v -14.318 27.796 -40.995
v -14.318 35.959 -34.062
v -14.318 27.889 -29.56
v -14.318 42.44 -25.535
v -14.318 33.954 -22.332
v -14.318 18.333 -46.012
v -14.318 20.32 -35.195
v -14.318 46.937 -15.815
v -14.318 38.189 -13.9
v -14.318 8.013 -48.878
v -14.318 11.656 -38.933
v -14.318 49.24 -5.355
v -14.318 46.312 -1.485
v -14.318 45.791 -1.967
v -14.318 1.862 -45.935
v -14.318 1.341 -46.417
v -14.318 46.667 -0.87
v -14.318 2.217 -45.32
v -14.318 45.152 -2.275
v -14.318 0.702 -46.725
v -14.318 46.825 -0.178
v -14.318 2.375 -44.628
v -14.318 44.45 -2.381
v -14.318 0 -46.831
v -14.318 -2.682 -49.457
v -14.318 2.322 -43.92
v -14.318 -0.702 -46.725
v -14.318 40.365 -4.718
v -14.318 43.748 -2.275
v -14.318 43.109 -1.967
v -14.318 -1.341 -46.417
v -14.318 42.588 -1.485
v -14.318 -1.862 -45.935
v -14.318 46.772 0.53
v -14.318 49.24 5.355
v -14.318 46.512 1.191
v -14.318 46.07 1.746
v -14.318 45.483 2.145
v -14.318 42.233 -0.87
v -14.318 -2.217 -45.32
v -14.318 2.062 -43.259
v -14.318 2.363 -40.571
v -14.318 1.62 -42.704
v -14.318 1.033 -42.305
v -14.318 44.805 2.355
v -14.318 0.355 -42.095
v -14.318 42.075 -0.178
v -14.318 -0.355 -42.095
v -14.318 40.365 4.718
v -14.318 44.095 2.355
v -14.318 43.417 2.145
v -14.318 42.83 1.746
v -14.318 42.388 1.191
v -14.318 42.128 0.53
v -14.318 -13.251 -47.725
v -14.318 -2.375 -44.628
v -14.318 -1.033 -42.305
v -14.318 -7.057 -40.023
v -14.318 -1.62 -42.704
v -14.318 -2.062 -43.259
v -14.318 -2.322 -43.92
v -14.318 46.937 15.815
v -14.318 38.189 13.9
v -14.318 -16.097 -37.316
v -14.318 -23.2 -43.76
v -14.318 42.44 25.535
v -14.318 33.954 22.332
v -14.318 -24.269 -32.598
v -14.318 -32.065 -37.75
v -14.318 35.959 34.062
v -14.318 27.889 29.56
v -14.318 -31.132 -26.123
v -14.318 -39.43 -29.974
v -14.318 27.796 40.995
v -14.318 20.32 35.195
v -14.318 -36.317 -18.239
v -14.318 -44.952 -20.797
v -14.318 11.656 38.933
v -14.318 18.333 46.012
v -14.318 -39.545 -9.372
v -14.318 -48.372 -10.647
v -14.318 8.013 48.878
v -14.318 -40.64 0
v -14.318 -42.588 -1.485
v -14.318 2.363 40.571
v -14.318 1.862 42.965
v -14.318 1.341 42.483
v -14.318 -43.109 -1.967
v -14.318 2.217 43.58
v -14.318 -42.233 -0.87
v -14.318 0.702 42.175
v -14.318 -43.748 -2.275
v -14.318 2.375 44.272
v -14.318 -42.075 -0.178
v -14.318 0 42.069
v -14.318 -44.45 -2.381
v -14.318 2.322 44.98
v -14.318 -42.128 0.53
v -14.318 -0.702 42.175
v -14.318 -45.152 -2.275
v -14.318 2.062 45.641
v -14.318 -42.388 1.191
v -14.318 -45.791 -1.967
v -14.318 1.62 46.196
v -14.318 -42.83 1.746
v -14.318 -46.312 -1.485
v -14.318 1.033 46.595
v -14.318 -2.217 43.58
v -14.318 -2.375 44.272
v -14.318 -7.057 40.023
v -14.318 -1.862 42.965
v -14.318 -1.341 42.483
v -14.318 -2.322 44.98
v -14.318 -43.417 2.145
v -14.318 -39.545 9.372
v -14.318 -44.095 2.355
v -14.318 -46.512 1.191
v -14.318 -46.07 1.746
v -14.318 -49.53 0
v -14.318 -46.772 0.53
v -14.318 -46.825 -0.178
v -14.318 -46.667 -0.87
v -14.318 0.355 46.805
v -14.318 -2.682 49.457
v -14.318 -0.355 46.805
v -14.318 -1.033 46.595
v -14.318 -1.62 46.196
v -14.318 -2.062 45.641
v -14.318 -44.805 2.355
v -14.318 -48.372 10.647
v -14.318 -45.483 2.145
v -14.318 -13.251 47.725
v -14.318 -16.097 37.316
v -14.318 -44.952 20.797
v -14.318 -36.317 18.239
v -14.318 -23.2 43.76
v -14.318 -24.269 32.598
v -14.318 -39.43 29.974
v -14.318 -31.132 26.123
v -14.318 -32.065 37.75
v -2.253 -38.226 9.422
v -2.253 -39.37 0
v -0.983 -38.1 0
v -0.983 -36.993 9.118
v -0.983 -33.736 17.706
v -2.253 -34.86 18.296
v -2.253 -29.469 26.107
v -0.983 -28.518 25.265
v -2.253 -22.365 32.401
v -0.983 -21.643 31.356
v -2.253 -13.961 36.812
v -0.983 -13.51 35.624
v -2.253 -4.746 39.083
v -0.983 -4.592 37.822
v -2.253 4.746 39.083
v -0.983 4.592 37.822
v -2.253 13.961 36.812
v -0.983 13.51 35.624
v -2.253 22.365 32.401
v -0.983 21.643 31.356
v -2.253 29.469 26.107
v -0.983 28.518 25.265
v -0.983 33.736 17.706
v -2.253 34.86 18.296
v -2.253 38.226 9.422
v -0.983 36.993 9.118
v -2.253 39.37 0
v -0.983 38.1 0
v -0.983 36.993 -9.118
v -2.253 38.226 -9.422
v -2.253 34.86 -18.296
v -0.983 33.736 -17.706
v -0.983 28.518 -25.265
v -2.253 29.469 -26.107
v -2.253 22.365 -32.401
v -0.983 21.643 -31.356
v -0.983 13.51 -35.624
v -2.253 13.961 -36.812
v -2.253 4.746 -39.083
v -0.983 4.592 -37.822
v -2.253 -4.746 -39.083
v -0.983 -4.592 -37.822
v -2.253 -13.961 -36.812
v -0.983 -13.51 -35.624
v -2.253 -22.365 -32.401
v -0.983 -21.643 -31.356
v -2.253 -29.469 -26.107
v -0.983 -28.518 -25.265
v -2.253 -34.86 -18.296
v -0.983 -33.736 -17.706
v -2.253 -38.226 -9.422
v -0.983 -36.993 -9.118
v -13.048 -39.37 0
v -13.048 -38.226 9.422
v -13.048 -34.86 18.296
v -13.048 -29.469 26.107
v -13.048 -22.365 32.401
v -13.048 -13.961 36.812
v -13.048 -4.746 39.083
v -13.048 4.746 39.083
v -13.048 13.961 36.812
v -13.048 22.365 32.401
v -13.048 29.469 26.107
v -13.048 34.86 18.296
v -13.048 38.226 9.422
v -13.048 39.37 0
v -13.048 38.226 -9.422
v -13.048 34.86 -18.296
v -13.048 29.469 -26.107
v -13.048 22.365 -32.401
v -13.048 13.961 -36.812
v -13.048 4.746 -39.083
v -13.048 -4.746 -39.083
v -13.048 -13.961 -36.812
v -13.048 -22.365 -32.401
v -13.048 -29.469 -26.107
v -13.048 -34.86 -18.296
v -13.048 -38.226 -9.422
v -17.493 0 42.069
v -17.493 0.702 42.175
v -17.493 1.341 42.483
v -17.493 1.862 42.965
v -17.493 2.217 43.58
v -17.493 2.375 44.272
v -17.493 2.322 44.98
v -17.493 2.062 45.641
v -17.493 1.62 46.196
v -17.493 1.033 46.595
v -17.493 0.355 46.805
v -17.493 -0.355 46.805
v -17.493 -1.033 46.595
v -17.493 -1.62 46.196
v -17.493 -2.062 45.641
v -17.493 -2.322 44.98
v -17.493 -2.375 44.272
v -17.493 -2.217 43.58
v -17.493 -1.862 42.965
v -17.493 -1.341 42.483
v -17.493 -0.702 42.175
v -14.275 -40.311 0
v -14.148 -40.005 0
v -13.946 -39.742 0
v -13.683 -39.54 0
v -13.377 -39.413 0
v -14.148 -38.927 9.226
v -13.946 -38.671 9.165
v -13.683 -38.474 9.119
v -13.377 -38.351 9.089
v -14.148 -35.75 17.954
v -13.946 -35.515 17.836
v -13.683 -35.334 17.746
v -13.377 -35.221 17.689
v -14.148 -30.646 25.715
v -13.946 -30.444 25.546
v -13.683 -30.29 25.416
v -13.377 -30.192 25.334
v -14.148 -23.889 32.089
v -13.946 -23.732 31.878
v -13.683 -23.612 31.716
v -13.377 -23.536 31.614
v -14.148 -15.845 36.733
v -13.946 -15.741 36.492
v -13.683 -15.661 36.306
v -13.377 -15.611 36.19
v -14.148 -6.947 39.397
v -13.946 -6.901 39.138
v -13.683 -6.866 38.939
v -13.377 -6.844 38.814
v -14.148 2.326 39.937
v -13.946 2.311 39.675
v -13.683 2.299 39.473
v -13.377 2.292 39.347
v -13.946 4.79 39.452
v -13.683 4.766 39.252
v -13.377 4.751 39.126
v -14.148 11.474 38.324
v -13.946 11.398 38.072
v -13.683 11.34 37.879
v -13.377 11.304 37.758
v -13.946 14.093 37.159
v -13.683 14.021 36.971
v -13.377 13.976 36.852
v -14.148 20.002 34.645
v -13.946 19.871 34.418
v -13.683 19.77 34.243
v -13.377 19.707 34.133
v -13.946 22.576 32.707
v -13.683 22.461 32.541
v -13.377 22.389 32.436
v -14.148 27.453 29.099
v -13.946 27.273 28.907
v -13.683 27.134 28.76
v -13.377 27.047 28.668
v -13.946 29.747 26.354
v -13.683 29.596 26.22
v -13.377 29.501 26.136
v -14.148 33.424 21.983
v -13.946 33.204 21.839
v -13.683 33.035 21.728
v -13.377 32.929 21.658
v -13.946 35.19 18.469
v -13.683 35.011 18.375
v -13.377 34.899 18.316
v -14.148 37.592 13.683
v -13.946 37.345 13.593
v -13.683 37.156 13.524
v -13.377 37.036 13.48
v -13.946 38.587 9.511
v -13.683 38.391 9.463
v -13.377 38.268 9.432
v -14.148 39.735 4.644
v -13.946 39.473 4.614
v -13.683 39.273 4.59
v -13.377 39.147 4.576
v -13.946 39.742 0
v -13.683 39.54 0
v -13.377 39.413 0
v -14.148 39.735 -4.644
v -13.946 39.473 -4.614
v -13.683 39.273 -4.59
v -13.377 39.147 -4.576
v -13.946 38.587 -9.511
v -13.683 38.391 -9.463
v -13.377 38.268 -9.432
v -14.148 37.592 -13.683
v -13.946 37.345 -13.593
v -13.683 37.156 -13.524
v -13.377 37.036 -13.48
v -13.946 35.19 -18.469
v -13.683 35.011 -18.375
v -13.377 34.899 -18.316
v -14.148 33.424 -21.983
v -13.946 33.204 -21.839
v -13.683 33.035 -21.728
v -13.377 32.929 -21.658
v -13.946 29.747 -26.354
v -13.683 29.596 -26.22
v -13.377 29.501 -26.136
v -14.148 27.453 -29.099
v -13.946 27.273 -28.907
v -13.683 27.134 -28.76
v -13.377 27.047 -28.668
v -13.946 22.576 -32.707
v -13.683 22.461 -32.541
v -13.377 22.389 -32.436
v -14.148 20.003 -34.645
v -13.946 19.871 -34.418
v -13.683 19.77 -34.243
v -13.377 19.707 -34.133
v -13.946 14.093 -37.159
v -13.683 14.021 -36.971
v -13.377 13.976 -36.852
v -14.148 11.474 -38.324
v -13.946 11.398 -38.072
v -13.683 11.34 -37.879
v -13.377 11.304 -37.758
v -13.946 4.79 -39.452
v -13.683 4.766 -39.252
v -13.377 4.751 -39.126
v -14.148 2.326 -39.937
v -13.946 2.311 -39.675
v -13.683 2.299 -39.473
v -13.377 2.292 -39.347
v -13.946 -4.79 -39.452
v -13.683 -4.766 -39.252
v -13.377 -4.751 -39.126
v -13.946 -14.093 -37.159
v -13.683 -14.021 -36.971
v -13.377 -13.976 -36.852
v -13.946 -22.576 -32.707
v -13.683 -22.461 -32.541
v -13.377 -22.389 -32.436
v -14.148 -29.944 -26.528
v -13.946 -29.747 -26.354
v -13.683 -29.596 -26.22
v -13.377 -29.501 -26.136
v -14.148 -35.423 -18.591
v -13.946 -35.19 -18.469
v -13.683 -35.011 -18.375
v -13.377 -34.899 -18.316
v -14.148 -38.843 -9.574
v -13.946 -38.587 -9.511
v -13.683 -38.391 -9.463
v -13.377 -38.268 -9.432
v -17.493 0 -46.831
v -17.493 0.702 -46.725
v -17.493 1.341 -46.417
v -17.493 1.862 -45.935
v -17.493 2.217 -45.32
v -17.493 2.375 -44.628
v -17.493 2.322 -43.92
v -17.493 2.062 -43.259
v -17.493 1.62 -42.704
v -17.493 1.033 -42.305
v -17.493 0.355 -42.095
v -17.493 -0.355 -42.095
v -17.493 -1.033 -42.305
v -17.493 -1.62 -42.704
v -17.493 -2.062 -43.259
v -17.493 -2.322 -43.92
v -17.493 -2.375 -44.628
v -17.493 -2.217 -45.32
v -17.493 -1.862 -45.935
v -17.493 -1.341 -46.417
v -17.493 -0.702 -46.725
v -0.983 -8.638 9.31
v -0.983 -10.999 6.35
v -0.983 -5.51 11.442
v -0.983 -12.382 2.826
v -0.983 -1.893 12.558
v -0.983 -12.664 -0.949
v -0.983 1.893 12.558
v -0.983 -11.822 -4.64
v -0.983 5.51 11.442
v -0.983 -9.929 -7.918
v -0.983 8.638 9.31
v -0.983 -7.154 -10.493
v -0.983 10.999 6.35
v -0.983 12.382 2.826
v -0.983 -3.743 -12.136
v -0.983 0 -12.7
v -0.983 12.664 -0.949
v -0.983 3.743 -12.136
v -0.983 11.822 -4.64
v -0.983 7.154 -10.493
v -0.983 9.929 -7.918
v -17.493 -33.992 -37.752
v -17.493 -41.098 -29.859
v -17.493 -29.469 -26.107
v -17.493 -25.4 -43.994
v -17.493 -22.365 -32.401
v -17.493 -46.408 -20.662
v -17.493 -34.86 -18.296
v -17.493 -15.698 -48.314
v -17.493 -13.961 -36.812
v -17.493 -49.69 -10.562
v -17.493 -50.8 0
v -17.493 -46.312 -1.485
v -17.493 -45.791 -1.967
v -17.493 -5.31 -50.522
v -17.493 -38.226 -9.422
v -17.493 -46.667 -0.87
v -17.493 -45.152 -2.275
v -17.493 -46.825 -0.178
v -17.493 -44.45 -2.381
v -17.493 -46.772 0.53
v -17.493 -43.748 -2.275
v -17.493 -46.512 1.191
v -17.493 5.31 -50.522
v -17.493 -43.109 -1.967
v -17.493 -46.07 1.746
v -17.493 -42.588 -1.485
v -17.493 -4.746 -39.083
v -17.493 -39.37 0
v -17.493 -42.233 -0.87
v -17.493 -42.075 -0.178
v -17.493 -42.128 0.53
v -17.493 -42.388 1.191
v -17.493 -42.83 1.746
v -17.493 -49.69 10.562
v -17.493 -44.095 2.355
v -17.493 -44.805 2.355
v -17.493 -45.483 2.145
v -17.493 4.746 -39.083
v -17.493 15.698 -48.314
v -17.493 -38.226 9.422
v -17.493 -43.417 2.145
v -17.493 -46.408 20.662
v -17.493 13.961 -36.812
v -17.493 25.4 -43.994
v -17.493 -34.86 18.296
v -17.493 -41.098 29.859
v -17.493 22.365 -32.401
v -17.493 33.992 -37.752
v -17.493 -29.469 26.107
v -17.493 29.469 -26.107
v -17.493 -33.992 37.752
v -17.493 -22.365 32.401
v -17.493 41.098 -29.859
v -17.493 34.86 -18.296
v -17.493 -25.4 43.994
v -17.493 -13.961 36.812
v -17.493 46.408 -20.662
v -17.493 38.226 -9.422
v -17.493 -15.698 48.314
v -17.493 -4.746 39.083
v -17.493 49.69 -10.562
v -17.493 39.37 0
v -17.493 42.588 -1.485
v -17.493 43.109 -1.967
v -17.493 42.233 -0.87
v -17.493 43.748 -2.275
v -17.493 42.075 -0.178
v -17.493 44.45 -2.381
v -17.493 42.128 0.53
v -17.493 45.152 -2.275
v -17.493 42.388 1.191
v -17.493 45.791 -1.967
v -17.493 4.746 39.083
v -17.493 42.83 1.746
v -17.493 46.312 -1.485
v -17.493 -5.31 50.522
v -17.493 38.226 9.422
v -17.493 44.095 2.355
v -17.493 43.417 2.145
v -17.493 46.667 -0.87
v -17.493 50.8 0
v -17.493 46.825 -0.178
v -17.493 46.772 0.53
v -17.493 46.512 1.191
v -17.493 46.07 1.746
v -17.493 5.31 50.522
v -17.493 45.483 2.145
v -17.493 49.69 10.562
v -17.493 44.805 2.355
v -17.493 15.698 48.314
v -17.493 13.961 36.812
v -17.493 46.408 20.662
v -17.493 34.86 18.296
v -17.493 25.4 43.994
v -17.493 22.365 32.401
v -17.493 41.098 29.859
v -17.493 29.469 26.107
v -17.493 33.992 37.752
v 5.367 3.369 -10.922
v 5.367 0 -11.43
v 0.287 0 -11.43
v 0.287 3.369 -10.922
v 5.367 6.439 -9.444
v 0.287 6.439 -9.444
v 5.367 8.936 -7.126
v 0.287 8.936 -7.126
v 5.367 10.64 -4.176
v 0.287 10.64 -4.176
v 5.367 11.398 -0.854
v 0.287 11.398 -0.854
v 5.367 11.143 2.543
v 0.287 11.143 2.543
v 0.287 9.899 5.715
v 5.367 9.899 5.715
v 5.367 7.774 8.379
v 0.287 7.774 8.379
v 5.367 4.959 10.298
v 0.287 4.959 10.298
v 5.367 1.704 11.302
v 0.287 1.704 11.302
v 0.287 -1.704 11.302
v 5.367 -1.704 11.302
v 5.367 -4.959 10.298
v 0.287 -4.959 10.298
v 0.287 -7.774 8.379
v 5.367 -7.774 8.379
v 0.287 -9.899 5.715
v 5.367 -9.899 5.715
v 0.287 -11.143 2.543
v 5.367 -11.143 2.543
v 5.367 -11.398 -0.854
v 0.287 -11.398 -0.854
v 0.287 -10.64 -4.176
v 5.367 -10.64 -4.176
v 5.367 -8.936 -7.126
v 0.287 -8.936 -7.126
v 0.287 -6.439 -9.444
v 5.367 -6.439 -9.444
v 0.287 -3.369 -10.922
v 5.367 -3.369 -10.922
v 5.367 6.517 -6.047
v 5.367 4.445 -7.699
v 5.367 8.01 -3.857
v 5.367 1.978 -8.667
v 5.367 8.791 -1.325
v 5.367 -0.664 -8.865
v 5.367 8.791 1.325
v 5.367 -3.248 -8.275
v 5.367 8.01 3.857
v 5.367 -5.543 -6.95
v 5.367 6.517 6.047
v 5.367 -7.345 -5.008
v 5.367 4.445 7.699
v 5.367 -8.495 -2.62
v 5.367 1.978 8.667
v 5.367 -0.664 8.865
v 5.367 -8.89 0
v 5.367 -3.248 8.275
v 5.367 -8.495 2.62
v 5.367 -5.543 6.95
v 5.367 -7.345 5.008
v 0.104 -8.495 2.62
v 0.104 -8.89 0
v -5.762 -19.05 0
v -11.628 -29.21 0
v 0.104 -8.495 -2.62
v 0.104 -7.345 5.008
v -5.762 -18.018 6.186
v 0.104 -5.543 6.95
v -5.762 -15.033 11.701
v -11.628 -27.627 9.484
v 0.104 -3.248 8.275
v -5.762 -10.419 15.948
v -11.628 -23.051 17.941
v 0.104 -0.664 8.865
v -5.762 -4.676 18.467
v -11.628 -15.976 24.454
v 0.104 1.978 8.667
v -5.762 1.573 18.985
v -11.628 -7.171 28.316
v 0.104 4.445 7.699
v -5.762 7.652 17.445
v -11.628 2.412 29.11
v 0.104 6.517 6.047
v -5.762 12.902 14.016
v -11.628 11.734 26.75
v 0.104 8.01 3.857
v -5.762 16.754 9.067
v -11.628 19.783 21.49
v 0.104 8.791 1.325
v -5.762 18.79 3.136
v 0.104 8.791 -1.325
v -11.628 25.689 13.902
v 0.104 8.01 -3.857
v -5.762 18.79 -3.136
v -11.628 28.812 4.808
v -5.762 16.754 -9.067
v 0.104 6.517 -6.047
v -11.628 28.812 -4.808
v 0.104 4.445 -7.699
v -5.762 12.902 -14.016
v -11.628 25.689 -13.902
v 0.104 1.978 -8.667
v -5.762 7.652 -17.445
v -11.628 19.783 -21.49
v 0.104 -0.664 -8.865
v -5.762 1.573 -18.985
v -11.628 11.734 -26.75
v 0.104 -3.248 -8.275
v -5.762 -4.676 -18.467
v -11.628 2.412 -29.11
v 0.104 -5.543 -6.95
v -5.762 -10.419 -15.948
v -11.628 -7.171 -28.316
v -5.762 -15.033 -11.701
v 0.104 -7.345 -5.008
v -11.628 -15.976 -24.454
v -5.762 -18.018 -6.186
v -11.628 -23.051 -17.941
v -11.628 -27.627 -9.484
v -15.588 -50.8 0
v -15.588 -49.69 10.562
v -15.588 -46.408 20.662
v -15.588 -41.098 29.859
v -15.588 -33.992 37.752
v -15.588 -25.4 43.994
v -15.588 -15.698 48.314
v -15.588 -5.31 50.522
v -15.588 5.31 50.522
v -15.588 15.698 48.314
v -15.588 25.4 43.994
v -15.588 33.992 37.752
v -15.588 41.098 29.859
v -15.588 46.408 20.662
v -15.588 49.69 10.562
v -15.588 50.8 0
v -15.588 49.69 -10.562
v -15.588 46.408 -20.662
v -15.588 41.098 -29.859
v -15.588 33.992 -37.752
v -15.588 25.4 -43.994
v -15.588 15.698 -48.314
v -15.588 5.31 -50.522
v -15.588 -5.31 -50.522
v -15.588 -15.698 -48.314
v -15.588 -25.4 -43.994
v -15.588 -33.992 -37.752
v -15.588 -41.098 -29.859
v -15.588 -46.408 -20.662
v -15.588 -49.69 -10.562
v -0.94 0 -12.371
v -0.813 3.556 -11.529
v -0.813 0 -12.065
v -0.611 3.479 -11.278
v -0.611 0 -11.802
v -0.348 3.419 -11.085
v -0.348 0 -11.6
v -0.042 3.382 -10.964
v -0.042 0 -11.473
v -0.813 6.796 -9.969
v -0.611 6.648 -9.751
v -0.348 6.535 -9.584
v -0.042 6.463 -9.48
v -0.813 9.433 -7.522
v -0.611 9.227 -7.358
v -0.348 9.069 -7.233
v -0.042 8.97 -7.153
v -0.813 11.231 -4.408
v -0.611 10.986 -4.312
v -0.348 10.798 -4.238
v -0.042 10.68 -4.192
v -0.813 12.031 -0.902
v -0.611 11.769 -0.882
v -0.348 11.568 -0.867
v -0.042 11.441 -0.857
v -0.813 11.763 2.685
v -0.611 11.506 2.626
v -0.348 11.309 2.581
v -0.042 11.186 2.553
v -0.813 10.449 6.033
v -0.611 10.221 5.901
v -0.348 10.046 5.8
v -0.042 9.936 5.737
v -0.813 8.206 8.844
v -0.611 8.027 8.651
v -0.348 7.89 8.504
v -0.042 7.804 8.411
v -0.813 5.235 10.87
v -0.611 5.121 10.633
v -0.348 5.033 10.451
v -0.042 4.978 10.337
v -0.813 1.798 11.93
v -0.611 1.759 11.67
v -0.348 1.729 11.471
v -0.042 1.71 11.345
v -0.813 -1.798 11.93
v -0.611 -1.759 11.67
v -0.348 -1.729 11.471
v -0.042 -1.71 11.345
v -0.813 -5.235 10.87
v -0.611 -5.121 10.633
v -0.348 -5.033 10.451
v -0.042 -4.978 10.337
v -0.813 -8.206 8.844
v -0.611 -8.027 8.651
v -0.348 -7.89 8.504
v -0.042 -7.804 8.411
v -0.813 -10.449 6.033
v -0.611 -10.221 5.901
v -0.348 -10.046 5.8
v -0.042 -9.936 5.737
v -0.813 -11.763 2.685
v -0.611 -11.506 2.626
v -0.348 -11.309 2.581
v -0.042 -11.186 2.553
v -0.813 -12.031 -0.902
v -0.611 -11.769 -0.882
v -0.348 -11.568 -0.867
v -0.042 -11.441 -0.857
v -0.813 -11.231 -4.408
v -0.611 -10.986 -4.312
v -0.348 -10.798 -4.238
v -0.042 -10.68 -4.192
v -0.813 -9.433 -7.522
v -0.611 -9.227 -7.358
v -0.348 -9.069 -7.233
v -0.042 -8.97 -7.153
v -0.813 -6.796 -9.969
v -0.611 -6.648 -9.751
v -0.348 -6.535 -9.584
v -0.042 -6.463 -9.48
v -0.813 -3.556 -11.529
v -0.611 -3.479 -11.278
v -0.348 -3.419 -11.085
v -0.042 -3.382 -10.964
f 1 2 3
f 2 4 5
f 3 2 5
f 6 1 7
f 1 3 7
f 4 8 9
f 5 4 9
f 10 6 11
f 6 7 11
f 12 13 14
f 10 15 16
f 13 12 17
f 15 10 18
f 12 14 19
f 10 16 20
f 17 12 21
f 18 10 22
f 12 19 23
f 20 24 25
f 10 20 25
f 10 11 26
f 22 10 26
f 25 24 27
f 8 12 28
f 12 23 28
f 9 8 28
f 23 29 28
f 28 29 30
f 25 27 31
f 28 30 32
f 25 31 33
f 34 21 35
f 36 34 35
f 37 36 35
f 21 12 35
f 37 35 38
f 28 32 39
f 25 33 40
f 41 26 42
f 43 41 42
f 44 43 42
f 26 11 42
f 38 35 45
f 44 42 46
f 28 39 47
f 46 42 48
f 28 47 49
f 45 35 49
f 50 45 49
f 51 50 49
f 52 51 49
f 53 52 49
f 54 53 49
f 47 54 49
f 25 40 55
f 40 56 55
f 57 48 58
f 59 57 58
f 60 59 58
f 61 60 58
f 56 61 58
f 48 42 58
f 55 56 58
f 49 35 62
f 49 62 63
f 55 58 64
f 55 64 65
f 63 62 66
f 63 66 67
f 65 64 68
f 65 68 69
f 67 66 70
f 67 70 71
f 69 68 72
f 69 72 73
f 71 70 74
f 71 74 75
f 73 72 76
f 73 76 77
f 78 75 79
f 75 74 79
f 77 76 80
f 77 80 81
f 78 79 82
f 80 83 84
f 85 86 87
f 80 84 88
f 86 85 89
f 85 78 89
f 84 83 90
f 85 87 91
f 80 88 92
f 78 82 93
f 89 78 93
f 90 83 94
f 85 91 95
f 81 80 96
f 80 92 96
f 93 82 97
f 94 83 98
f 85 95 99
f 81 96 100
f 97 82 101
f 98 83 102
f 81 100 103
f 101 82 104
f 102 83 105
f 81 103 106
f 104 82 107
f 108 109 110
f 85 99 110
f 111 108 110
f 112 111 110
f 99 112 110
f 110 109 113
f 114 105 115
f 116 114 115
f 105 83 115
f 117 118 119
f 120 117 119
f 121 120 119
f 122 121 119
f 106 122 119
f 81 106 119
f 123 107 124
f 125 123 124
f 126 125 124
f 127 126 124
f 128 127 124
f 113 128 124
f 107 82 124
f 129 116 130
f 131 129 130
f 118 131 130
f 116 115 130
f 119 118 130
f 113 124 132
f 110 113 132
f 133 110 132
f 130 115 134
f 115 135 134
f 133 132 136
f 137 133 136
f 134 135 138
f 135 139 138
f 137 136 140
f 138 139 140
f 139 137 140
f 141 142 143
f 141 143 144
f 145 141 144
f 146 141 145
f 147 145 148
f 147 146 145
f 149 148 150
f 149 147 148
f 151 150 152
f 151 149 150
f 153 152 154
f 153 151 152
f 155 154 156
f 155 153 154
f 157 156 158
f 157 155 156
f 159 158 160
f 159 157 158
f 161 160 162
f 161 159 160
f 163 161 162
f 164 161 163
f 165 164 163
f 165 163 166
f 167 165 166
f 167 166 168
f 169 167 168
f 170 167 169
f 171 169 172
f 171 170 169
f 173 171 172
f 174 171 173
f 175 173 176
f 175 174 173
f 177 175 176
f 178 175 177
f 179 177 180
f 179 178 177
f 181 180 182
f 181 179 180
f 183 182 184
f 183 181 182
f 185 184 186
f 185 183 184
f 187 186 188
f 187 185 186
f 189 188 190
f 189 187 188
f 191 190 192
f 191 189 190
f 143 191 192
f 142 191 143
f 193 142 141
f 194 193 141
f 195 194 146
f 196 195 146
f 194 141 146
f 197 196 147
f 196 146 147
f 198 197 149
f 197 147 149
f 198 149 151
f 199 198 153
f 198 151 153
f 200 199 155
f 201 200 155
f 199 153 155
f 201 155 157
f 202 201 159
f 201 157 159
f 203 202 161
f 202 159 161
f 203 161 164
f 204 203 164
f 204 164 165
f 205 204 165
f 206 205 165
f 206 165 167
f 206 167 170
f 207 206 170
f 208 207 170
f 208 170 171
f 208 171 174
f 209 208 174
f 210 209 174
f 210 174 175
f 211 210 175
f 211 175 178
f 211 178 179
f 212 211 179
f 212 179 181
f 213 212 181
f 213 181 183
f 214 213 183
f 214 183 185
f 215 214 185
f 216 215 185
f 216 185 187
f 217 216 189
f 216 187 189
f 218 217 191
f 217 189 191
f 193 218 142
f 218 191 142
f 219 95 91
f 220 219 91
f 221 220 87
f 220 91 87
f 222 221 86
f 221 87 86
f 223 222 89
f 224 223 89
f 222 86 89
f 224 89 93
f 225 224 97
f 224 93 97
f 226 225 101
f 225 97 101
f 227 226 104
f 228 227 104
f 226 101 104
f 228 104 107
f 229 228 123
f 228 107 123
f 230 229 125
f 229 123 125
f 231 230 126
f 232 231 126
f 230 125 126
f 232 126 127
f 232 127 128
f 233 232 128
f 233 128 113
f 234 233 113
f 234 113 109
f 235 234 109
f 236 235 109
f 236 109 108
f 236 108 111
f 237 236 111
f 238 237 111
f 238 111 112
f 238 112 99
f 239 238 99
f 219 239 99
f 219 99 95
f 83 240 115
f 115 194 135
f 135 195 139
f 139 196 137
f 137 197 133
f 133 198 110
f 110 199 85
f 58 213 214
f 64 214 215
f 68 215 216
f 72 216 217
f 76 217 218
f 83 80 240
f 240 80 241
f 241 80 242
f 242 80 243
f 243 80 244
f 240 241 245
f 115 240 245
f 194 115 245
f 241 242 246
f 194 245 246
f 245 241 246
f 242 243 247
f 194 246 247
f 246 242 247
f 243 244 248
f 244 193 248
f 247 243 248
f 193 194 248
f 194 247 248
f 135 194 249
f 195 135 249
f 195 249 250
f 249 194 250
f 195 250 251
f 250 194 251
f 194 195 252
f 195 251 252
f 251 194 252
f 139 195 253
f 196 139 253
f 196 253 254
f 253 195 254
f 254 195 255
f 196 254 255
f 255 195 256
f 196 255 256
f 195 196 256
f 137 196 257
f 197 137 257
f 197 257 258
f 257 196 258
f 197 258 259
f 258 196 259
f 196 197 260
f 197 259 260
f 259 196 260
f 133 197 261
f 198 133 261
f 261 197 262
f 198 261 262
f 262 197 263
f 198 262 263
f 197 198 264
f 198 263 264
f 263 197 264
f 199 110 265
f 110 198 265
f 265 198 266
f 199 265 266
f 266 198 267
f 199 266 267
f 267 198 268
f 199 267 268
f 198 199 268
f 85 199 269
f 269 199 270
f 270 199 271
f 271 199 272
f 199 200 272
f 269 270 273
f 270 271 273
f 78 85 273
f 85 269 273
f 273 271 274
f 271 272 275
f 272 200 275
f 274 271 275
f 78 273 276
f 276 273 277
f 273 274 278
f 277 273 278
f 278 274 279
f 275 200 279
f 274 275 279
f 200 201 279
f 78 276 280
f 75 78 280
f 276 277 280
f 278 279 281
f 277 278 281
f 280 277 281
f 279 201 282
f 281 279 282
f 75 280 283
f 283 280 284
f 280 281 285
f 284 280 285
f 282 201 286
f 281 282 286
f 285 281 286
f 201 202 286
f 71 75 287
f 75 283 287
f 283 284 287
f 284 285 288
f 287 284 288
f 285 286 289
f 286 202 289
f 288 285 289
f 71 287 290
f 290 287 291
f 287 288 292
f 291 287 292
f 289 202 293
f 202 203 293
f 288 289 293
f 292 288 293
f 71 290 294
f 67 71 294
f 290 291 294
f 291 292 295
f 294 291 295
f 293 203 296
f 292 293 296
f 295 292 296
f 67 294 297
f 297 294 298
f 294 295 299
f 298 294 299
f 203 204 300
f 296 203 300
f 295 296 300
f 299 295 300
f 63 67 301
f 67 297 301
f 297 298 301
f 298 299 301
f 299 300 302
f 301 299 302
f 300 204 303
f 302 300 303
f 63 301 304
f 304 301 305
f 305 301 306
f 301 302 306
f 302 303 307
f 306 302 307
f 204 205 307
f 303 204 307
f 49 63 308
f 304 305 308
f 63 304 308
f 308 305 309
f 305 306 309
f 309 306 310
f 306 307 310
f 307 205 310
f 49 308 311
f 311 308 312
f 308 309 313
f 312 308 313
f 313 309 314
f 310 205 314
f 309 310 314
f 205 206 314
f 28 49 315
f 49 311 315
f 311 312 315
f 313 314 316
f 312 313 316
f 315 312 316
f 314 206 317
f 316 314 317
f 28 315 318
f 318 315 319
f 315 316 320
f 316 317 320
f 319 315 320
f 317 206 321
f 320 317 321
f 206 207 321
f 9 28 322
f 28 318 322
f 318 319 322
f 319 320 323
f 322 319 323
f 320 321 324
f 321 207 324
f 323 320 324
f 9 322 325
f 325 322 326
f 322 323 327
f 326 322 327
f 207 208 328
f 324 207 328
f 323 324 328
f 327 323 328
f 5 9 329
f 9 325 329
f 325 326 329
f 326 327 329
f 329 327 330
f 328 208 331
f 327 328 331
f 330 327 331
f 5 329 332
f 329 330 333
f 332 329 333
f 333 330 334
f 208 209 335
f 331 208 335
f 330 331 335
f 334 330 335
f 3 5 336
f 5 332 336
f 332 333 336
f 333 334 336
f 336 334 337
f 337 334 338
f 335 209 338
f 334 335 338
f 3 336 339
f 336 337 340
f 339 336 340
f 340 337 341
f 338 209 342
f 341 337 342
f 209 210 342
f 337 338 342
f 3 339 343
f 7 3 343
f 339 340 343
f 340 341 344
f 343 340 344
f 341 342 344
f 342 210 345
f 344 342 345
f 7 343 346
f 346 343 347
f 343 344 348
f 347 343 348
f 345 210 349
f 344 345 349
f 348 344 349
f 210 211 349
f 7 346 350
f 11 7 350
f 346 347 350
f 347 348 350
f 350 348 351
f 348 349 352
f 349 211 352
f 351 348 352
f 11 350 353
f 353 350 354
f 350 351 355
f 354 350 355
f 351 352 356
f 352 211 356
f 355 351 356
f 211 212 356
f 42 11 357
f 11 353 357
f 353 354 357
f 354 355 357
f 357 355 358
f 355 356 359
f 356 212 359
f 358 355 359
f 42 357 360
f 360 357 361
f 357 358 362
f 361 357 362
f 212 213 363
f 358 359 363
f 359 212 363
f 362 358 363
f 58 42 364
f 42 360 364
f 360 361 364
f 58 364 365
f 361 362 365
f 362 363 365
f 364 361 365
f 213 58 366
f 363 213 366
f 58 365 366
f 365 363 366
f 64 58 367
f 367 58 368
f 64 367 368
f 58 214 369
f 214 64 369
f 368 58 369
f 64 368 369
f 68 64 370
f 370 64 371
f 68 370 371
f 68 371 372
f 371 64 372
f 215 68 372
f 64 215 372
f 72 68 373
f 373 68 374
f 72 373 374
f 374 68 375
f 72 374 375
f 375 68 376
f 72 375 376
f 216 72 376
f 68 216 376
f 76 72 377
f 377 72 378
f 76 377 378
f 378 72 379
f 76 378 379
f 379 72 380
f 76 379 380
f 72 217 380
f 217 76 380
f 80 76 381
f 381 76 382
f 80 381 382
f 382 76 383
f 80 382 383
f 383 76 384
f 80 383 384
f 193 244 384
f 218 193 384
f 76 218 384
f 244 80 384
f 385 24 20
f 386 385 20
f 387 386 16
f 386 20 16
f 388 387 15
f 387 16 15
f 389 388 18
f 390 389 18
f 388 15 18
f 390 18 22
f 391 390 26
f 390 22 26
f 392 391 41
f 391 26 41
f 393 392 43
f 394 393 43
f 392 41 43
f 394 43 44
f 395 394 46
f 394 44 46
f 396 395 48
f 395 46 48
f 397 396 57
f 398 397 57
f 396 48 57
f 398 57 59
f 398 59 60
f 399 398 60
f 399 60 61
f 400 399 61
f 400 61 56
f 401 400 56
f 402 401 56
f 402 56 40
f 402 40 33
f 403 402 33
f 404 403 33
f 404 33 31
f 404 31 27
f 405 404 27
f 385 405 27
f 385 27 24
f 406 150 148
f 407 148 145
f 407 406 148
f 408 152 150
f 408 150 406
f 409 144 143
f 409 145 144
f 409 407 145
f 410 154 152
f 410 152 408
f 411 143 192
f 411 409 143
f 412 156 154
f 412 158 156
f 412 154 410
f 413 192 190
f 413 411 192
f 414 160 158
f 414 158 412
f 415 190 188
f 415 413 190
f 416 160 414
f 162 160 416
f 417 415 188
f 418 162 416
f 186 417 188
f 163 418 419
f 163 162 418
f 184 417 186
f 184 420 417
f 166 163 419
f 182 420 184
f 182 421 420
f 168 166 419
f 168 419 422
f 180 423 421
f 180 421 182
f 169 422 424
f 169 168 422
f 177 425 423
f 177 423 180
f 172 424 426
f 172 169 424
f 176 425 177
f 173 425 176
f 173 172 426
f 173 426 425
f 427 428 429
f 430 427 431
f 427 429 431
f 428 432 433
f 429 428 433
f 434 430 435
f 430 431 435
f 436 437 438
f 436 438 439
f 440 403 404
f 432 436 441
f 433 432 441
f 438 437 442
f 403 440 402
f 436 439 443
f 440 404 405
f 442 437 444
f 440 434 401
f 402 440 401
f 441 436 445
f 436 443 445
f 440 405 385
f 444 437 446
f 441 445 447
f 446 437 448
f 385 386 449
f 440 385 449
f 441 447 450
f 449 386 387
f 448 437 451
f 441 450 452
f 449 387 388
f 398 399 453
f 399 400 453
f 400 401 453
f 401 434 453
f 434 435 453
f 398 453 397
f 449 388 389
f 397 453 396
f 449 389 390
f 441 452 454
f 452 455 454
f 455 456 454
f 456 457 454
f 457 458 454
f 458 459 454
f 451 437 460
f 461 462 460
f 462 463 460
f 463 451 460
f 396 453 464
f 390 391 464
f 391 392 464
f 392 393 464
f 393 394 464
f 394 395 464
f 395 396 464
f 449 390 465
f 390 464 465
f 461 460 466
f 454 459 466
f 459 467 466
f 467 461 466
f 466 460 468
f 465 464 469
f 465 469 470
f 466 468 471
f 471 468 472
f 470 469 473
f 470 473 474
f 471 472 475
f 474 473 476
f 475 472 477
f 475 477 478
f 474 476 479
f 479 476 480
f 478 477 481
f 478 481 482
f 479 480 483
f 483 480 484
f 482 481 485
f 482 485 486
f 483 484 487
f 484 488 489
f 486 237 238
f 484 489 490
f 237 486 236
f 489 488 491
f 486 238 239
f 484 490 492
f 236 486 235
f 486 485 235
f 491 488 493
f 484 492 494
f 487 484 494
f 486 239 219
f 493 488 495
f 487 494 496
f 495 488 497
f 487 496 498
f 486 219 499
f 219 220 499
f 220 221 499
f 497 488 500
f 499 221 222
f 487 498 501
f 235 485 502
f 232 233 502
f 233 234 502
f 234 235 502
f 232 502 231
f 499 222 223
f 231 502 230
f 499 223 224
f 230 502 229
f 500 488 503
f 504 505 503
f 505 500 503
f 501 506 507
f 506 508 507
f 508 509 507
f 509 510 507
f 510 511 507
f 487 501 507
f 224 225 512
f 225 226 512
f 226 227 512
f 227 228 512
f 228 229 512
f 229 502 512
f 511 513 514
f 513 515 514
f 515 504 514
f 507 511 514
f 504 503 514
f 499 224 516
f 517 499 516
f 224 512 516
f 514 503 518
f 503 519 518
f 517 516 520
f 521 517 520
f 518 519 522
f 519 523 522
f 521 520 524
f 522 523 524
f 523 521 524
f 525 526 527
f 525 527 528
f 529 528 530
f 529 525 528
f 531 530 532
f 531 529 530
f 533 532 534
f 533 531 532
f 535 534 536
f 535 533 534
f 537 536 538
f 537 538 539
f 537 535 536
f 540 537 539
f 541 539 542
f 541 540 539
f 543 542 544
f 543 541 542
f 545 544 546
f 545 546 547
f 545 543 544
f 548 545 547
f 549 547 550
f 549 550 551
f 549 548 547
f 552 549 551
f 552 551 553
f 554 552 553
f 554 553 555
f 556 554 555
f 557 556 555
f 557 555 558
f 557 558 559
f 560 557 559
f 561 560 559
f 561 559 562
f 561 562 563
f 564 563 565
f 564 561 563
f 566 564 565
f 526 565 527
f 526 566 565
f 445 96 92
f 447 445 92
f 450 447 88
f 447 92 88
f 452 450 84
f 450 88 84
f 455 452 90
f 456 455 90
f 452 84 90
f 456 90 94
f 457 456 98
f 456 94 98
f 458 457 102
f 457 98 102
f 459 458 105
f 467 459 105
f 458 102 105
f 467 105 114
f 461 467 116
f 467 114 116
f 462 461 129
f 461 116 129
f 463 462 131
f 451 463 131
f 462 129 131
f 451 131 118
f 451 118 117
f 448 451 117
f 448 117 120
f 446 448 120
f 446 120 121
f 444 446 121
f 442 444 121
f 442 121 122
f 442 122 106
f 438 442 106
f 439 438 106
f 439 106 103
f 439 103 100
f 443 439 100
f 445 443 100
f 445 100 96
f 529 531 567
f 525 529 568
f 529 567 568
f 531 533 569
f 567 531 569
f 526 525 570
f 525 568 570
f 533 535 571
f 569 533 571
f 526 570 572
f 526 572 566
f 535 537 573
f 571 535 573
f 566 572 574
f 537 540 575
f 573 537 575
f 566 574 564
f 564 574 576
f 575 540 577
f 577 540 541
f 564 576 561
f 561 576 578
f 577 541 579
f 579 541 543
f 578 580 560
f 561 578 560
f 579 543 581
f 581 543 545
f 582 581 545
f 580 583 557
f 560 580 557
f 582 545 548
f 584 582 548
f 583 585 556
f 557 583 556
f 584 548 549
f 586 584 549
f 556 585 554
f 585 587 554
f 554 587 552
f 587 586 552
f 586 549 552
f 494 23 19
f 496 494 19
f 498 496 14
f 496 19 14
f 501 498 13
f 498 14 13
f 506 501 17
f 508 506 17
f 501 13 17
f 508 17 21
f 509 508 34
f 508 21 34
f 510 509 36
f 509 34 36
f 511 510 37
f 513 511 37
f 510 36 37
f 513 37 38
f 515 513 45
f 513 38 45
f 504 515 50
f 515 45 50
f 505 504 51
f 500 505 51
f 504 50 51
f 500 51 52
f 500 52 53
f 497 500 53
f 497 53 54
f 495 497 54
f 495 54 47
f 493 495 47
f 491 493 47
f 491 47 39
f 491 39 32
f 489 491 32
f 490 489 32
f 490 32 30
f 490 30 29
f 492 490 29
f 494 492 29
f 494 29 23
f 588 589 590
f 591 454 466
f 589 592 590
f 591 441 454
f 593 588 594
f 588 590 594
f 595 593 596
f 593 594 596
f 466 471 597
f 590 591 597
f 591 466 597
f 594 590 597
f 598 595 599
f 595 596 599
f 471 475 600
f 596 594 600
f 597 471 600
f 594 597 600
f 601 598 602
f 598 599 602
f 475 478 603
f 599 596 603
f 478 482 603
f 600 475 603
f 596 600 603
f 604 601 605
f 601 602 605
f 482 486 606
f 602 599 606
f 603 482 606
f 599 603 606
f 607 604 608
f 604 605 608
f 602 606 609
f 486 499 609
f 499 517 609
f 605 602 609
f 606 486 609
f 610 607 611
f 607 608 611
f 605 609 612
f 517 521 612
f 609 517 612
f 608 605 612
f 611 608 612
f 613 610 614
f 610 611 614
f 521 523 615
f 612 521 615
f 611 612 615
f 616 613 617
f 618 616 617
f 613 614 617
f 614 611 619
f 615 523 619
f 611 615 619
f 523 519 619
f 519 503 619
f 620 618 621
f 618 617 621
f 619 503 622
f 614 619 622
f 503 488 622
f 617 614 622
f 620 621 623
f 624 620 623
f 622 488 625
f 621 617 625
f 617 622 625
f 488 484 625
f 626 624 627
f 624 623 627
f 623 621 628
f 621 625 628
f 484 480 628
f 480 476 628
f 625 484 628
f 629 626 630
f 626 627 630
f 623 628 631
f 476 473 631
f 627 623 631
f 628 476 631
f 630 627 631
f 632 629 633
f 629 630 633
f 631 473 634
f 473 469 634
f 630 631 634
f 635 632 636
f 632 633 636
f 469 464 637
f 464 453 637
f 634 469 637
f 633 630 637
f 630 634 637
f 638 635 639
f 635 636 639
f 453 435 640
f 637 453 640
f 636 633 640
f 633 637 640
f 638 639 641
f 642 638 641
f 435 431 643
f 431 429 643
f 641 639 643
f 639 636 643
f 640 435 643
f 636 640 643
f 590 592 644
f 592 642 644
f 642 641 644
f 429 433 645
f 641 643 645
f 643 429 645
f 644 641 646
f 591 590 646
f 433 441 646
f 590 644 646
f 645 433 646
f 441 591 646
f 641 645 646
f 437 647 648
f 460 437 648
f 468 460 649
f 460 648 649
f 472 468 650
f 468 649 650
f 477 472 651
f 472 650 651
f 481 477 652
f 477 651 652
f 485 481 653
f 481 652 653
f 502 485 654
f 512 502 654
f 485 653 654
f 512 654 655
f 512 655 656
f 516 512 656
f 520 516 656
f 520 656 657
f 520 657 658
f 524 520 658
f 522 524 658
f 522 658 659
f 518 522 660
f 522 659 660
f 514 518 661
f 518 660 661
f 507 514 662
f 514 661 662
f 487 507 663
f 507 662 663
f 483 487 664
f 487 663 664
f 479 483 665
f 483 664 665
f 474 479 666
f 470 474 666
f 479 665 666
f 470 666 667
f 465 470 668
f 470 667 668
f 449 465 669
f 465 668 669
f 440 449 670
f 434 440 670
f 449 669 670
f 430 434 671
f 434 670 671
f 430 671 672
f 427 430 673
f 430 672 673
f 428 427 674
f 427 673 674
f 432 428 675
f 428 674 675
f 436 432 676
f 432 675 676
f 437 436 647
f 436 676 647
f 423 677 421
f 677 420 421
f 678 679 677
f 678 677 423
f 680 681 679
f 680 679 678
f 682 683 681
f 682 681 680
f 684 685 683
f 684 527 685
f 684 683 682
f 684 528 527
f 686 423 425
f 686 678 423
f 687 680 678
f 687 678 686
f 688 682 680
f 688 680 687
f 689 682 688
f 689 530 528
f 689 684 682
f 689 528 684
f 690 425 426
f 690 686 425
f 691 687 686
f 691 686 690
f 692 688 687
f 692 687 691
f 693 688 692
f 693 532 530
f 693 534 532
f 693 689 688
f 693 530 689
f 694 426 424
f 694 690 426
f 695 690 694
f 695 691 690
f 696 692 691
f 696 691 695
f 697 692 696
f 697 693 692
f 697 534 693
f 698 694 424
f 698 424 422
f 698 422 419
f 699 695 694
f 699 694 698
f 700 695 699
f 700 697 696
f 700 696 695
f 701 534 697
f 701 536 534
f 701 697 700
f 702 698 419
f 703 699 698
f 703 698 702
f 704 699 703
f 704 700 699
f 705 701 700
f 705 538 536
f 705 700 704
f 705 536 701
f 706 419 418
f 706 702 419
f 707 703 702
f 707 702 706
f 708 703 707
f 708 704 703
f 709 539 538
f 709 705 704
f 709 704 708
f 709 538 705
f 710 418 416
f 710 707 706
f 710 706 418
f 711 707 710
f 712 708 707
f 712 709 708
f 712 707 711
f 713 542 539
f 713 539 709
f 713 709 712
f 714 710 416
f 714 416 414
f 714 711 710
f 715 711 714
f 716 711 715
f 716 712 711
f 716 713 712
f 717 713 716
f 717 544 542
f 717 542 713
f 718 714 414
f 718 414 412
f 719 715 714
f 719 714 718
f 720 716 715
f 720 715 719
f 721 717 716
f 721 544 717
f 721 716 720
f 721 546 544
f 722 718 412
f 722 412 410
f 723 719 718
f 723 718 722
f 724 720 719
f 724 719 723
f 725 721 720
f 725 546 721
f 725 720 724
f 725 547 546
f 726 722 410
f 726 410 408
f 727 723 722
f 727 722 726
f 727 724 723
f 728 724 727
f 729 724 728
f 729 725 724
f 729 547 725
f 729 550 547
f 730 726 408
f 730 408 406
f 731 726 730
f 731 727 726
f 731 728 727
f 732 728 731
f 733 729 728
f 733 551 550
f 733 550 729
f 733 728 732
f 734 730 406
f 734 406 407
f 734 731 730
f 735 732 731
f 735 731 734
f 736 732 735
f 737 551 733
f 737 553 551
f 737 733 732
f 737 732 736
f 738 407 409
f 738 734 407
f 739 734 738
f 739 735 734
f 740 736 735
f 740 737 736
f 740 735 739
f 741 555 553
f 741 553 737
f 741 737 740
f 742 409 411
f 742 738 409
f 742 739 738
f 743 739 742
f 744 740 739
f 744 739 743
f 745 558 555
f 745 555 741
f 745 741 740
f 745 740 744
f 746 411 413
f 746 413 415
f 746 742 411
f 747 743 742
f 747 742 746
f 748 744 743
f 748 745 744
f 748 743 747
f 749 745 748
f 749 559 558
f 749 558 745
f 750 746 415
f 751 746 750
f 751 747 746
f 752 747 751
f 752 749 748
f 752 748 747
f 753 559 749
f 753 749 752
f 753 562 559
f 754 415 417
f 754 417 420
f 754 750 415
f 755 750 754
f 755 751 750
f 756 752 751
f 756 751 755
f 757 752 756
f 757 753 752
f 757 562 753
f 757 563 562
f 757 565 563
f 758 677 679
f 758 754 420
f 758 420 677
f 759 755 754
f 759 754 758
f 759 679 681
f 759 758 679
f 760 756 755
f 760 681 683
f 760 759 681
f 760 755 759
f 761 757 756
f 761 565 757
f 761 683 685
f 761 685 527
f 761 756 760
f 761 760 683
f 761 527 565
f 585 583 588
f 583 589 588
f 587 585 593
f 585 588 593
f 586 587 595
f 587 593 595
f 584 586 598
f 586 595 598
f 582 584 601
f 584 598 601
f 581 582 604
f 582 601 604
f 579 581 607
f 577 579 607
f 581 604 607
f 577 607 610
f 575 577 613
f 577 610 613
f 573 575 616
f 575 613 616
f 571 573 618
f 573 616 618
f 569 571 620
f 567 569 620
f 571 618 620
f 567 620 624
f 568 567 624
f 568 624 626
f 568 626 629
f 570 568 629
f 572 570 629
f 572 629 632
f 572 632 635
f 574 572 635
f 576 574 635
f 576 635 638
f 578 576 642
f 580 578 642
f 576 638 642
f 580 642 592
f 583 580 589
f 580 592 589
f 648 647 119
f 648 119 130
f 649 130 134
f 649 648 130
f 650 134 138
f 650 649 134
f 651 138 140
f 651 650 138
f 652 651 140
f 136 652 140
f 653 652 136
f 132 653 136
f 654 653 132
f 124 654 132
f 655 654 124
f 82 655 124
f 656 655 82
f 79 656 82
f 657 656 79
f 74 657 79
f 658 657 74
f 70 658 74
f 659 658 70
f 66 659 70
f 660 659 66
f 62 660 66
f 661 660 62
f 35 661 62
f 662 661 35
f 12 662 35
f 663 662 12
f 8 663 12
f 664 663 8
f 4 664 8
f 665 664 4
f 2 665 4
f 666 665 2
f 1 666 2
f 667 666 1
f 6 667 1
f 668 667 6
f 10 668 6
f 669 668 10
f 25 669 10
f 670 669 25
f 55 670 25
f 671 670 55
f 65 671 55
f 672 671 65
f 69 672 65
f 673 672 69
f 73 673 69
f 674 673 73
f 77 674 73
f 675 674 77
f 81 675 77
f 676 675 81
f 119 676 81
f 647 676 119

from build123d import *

# Parameters (mm, degrees)
FILLET1_R                          = 1.27
SKETCH3_R                          = 39.37
SKETCH3_R_2                        = 11.43
CUT_EXTRUDE1_DEPTH                 = 6.35
CHAMFER1_SIZE                      = 1.27
FILLET2_R                          = 1.27
F_3_16_0_1875_DIAMETER_HOLE1_D     = 4.7625
F_3_16_0_1875_DIAMETER_HOLE1_DEPTH = 13.97
F_3_16_0_1875_DIAMETER_HOLE1_TIP   = 1.430799349


with BuildPart() as part:
    # Sketch1 → Revolve1 (revolve)
    with BuildSketch(Plane.XY):
        Polygon((-17.49338415, -39.37), (-17.49338415, -50.8), (-14.31838415, -50.8), (-14.31838415, -39.37), (5.36661585, -39.37), (5.36661585, -8.89), (0.104252055, -8.89), align=None)
    revolve(axis=Axis((18.935801868, 0, 0), (-1, 0, 0)))

    # Fillet1
    fillet1_edges = [part.edges().sort_by_distance(p)[0] for p in [
        (-14.31838415, 39.37, 0),
    ]]
    fillet(fillet1_edges, radius=FILLET1_R)

    # Sketch3 → Cut-Extrude1 (cut)
    with BuildSketch(Plane(origin=(5.36661585, 0, 0), x_dir=(0, 0, -1), z_dir=(1, 0, 0))):
        Circle(SKETCH3_R)
        Circle(SKETCH3_R_2, mode=Mode.SUBTRACT)
    extrude(amount=-CUT_EXTRUDE1_DEPTH, mode=Mode.SUBTRACT)

    # Chamfer1
    chamfer1_edges = [part.edges().sort_by_distance(p)[0] for p in [
        (-0.98338415, 39.37, 0),
        (-14.31838415, 50.8, 0),
    ]]
    chamfer(chamfer1_edges, length=CHAMFER1_SIZE)

    # Fillet2
    fillet2_edges = [part.edges().sort_by_distance(p)[0] for p in [
        (-0.98338415, 0, 11.43),
    ]]
    fillet(fillet2_edges, radius=FILLET2_R)

    # 3/16 (0.1875) Diameter Hole1
    with Locations(Plane.ZY.offset(17.49338415)):
        with Locations((-44.45, 0), (0, 44.45), (44.45, 0), (0, -44.45)):
            Hole(F_3_16_0_1875_DIAMETER_HOLE1_D / 2, depth=F_3_16_0_1875_DIAMETER_HOLE1_DEPTH)
            with Locations((0, 0, -(F_3_16_0_1875_DIAMETER_HOLE1_DEPTH + F_3_16_0_1875_DIAMETER_HOLE1_TIP / 2))):  # 118° drill point
                Cone(0, F_3_16_0_1875_DIAMETER_HOLE1_D / 2, F_3_16_0_1875_DIAMETER_HOLE1_TIP, mode=Mode.SUBTRACT)


solid = part.part
